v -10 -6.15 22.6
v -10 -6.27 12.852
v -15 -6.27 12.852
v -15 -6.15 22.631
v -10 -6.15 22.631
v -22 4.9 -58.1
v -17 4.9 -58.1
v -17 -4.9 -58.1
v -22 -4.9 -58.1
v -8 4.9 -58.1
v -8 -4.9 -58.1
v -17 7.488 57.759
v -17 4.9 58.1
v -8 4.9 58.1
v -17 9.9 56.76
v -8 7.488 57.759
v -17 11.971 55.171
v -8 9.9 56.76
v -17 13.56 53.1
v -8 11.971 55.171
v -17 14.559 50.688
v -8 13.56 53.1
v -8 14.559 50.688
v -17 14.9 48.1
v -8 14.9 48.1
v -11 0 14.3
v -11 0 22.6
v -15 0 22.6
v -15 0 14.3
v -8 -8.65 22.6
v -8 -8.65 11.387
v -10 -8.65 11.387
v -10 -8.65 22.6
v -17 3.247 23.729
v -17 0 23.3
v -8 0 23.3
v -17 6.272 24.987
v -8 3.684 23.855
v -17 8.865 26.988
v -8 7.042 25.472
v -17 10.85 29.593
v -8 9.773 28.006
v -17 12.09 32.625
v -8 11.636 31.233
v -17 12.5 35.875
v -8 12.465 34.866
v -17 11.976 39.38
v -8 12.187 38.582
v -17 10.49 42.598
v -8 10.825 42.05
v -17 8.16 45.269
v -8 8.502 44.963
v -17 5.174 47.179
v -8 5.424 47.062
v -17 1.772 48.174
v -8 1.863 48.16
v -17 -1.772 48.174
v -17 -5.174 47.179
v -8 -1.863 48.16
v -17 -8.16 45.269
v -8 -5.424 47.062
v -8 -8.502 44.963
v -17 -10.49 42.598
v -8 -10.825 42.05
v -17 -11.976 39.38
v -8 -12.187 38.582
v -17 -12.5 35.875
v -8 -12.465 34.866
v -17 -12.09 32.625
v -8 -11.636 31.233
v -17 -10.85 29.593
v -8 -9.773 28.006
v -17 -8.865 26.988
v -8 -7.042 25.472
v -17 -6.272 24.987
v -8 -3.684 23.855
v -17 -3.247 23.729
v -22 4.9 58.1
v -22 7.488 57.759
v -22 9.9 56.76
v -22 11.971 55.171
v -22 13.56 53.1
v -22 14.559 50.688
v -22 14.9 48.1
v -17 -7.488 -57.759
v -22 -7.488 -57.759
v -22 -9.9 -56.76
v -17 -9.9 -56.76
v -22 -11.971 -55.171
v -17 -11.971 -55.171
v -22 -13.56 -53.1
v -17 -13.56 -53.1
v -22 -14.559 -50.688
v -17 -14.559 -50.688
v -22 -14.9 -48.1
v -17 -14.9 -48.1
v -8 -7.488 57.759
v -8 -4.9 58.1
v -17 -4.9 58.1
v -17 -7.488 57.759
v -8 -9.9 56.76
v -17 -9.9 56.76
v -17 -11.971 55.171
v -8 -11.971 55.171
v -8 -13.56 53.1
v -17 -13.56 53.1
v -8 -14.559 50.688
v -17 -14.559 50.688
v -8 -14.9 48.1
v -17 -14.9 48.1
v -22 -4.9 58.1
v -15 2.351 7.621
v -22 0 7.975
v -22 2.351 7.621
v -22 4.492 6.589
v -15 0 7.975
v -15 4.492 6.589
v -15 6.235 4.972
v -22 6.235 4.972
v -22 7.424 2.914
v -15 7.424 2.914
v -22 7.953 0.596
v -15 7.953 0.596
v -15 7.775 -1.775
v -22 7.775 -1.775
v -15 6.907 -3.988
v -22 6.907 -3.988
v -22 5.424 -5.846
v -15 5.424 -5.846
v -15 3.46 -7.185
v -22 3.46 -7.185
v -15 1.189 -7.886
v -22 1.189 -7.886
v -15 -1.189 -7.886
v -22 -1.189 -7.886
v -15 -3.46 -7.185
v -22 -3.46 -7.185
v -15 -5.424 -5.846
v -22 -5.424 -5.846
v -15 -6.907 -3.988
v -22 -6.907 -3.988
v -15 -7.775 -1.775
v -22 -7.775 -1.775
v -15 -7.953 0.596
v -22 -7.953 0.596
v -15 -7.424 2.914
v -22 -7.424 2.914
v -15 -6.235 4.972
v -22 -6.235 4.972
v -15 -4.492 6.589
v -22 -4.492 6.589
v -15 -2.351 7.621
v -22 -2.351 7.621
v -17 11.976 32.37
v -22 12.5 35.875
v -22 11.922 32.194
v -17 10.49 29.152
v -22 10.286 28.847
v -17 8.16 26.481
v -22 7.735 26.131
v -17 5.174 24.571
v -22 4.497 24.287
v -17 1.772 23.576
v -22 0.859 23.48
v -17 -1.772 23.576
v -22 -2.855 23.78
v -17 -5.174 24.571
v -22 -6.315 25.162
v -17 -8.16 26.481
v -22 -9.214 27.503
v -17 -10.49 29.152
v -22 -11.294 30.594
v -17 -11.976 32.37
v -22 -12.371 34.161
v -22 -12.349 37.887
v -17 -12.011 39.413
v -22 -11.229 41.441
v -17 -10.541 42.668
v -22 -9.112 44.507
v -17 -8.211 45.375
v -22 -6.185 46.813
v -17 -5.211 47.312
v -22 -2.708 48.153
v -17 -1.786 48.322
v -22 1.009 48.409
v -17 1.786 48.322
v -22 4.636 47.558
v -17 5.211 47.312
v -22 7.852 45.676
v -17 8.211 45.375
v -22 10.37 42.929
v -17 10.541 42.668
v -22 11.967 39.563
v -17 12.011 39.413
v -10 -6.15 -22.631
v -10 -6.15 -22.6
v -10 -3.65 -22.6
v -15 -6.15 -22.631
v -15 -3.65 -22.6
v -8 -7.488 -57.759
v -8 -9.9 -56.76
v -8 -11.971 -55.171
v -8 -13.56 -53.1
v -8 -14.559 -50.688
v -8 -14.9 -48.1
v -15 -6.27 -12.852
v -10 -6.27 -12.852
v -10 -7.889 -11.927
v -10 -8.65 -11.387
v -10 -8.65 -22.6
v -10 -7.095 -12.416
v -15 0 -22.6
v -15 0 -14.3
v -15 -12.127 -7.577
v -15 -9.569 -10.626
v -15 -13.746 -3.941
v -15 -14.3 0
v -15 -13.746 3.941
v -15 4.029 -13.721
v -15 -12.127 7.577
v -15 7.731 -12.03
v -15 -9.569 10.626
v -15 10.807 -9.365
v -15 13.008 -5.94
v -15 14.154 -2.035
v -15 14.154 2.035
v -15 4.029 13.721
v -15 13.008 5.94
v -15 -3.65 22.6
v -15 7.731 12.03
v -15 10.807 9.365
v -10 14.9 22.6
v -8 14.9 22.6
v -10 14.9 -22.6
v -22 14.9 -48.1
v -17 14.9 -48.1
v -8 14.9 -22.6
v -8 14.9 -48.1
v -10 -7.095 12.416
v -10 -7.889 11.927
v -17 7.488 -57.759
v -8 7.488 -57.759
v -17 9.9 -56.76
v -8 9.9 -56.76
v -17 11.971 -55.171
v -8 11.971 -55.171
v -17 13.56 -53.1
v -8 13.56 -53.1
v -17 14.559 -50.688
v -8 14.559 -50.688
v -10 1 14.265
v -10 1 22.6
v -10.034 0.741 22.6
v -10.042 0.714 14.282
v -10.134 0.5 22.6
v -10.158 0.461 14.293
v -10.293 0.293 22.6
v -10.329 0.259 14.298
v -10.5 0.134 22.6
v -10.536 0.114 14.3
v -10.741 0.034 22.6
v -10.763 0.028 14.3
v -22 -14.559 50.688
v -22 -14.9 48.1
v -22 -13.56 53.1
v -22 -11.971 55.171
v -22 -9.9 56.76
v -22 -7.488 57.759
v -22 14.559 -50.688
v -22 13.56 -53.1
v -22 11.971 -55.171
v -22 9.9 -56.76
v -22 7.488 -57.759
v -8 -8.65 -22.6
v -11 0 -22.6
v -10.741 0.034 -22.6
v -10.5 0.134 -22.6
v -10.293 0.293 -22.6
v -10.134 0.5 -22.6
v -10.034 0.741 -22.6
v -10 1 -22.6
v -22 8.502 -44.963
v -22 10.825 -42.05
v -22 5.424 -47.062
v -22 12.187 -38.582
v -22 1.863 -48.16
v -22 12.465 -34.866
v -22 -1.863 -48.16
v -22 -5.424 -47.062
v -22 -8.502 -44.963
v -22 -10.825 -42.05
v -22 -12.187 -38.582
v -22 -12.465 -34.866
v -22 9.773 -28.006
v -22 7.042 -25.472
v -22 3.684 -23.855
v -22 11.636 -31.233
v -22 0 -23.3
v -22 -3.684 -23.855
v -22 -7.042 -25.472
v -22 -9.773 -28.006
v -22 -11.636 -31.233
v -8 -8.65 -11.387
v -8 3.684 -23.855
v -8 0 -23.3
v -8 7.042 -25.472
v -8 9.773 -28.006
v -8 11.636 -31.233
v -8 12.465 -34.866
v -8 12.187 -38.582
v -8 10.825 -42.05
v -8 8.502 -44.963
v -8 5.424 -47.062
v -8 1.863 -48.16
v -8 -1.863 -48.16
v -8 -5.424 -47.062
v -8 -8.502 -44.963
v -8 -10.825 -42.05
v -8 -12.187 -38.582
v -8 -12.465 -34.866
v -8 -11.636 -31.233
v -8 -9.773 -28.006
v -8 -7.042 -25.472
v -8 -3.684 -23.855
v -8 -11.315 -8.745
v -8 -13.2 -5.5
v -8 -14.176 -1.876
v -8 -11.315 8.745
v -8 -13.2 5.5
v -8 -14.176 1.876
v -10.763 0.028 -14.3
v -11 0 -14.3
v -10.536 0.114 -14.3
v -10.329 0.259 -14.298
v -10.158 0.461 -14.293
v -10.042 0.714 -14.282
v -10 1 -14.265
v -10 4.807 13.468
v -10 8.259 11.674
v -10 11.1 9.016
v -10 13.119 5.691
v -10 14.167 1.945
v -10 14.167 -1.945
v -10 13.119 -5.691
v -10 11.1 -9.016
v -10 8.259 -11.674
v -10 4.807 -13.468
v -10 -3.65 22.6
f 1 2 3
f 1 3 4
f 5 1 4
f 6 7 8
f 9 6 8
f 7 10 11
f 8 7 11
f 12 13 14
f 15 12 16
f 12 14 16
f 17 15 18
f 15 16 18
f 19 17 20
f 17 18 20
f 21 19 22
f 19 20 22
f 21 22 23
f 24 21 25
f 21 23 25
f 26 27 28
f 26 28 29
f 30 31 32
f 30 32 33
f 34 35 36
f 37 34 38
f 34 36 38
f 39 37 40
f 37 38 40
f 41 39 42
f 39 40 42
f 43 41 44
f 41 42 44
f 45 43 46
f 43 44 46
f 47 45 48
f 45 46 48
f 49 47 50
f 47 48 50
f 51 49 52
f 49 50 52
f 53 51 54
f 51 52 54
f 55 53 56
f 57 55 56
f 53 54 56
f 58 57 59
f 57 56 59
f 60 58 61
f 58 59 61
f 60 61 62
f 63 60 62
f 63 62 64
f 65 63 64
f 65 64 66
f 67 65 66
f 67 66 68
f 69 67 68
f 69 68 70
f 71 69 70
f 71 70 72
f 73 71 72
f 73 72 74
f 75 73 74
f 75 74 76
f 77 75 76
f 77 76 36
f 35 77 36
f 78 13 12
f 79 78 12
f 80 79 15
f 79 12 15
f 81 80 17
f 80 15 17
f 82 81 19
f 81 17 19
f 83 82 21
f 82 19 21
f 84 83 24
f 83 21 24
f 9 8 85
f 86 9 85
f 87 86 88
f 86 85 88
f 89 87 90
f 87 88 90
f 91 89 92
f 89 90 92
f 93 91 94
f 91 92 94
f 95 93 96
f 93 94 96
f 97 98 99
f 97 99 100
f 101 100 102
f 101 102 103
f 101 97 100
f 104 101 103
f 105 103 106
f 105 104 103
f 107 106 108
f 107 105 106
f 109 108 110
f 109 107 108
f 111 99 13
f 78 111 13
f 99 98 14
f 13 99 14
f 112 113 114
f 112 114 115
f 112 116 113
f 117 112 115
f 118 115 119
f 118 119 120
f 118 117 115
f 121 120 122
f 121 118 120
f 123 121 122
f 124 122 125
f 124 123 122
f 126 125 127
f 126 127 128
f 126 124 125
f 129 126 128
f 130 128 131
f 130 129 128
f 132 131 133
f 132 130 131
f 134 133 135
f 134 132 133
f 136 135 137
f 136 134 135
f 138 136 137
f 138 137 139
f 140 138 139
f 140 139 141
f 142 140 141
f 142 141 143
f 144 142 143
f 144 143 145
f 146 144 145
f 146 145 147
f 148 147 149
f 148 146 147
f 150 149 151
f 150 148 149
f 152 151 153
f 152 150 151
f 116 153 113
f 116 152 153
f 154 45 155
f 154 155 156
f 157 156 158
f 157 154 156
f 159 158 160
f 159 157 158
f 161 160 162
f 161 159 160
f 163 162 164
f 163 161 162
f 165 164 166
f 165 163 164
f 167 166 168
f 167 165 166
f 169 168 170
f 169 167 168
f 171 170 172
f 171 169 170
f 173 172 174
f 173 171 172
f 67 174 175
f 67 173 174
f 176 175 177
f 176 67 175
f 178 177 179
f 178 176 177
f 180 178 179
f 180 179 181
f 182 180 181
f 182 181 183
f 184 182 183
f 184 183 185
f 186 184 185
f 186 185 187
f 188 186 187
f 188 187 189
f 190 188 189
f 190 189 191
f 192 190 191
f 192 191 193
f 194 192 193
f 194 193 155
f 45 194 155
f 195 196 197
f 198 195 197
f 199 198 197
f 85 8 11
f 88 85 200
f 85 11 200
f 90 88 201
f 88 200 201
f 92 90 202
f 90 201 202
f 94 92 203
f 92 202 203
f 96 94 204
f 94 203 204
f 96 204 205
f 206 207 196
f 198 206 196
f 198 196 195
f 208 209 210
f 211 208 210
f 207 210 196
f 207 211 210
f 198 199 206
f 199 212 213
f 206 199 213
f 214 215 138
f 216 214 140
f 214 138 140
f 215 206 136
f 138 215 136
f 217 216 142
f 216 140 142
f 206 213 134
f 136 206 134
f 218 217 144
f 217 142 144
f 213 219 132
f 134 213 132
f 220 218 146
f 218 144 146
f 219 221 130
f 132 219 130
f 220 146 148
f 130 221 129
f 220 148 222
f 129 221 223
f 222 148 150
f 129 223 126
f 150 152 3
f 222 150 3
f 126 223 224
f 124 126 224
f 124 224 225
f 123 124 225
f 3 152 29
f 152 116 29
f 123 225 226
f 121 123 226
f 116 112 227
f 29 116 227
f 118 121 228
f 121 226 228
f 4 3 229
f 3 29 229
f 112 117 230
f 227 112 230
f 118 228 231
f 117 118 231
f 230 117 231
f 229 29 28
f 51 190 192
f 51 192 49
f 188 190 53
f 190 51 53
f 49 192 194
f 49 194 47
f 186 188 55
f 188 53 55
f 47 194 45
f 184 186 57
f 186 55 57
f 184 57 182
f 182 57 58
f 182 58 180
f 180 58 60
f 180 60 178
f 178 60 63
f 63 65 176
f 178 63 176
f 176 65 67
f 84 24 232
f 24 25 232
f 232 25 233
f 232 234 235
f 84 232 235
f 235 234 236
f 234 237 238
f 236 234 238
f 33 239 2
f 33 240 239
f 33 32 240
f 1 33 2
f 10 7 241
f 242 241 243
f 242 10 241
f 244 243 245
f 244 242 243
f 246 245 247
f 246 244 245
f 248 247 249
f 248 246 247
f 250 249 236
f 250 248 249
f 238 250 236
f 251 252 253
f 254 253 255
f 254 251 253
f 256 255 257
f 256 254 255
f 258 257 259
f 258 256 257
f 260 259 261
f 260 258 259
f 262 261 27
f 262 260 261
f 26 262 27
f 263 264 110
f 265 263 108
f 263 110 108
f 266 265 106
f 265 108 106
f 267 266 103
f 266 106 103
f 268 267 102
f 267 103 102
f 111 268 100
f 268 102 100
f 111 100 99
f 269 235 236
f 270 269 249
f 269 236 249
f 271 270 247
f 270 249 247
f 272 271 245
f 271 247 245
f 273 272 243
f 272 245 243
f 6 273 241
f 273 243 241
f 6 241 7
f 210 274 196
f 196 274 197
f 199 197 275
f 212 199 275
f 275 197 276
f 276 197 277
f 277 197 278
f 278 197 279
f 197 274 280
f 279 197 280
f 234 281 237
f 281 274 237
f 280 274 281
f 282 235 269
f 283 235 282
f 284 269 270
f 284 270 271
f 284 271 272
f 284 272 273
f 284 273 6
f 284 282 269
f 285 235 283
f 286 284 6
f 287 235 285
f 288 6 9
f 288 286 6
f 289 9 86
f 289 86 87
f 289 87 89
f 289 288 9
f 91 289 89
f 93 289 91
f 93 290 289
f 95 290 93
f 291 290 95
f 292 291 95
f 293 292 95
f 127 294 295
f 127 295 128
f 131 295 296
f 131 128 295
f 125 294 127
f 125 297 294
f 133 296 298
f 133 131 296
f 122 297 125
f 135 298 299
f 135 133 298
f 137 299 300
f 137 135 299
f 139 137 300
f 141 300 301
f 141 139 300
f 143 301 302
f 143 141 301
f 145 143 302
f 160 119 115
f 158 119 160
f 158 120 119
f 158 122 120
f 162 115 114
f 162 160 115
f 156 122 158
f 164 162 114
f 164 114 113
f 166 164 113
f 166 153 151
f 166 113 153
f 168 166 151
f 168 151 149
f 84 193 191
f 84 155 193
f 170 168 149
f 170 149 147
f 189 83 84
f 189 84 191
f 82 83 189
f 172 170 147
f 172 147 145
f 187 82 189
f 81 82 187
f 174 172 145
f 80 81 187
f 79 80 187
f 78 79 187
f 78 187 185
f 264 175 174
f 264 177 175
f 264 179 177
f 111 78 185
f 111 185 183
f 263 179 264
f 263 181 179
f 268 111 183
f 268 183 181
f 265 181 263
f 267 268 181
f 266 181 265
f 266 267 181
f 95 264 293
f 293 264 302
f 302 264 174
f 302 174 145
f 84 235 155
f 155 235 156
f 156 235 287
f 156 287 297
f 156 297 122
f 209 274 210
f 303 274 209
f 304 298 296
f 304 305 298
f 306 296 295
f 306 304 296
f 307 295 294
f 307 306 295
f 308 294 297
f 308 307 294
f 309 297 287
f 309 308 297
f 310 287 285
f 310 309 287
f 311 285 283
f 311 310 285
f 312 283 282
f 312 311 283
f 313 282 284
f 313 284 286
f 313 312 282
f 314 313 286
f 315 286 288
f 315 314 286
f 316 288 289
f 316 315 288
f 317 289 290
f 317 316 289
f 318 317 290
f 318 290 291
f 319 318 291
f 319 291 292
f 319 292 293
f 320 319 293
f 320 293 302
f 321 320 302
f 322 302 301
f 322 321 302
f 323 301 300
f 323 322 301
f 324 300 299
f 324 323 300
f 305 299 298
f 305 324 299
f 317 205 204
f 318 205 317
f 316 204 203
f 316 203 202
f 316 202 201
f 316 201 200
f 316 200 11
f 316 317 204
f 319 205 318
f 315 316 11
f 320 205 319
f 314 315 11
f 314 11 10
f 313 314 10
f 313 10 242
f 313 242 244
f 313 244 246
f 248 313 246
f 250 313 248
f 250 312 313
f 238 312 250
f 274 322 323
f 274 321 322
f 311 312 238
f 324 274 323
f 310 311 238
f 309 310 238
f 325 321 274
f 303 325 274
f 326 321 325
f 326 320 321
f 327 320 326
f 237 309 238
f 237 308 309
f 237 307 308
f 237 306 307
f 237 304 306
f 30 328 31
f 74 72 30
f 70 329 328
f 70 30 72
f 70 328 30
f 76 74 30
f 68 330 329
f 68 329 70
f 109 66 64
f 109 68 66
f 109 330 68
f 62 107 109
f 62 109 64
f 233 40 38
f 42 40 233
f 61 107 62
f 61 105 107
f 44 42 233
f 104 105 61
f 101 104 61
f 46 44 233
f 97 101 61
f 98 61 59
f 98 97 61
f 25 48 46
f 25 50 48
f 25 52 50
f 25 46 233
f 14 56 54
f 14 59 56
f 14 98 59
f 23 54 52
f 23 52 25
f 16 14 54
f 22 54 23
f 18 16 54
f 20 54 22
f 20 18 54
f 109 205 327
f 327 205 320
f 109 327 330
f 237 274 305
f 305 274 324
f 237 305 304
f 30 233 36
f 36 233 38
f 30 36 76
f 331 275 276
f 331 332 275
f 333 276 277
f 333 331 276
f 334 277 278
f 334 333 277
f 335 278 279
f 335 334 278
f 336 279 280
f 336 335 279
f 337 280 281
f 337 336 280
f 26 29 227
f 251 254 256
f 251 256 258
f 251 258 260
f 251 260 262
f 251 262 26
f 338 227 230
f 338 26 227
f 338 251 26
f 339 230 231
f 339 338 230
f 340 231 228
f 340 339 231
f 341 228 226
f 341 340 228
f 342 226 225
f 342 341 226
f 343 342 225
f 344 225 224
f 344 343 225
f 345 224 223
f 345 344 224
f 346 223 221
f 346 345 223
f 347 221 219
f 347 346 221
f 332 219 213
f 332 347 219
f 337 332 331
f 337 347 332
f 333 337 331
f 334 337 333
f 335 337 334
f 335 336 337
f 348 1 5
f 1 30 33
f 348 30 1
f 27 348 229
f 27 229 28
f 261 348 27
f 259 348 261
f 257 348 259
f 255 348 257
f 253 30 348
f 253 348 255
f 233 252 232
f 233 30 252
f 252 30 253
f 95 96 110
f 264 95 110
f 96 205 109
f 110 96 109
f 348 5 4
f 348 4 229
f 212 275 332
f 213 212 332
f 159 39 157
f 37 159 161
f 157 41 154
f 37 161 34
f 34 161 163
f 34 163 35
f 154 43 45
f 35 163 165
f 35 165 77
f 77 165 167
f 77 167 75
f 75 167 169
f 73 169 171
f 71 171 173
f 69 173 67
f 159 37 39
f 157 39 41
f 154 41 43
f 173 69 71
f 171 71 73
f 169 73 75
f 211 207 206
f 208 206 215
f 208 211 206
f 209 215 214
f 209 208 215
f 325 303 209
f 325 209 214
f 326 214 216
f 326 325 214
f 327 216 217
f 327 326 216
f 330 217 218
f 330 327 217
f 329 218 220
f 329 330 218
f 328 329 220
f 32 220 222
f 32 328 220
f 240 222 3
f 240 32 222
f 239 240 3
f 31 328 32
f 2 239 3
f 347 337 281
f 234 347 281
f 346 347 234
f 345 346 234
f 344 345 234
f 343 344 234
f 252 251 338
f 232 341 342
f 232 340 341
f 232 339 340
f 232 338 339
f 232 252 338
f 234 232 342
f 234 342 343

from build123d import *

# Parameters (mm, degrees)
BOSS_EXTRUDE1_START  = -17
BOSS_EXTRUDE1_DEPTH  = 34
SKETCH2_R            = 14.3
CUT_EXTRUDE1_DEPTH   = 32
SKETCH3_R            = 7.975
CUT_EXTRUDE2_DEPTH   = 68.982497748
SKETCH4_R            = 12.5
CUT_EXTRUDE3_DEPTH   = 69.946500999
FILLET5_R            = 10
FILLET6_R            = 10
FILLET5_OF_MIRROR1_R = 10
FILLET6_OF_MIRROR1_R = 10
SKETCH12_W           = 71.004828568
SKETCH12_H           = 128.011080482
CUT_EXTRUDE4_DEPTH   = 25
SKETCH13_W           = 23.55
SKETCH13_H           = 45.2
CUT_EXTRUDE5_DEPTH   = 2
CUT_EXTRUDE6_DEPTH   = 5
SKETCH15_R           = 12.5
SKETCH15_R_2         = 7.975
BOSS_EXTRUDE2_DEPTH  = 5
FILLET7_R            = 1
FILLET8_R            = 1


with BuildPart() as part:
    # Sketch1 → Boss-Extrude1 (new body)
    with BuildSketch(Plane.YZ.offset(BOSS_EXTRUDE1_START)):
        with BuildLine():
            Line((-14.9, 0), (-14.9, 58.1))
            Line((-14.9, 58.1), (14.9, 58.1))
            Line((14.9, 58.1), (14.9, 0))
            ThreePointArc((14.9, 0), (0, -14.9), (-14.9, 0))
        make_face()
    boss_extrude1 = extrude(amount=BOSS_EXTRUDE1_DEPTH)

    # Sketch2 → Cut-Extrude1 (cut)
    with BuildSketch(Plane.YZ.offset(17)):
        with Locations(Location((0, 0, 0), (0, 0, 270))):
            Circle(SKETCH2_R)
    cut_extrude1 = extrude(amount=-CUT_EXTRUDE1_DEPTH, mode=Mode.SUBTRACT)

    # Sketch3 → Cut-Extrude2 (cut, through all)
    with BuildSketch(Plane.YZ.offset(-15)):
        with Locations(Location((0, 0, 0), (0, 0, 270))):
            Circle(SKETCH3_R)
    cut_extrude2 = extrude(amount=-CUT_EXTRUDE2_DEPTH, mode=Mode.SUBTRACT)

    # Sketch4 → Cut-Extrude3 (cut, through all)
    with BuildSketch(Plane.YZ.offset(17)):
        with Locations(Location((0, 35.8, 0), (0, 0, 270))):
            Circle(SKETCH4_R)
    cut_extrude3 = extrude(amount=-CUT_EXTRUDE3_DEPTH, mode=Mode.SUBTRACT)

    # Fillet5
    fillet5_edges = [part.edges().sort_by_distance(p)[0] for p in [
        (0, 14.9, 58.1),
    ]]
    fillet(fillet5_edges, radius=FILLET5_R)

    # Fillet6
    fillet6_edges = [part.edges().sort_by_distance(p)[0] for p in [
        (0, -14.9, 58.1),
    ]]
    fillet(fillet6_edges, radius=FILLET6_R)

    # Mirror1: Boss-Extrude1, Cut-Extrude1, Cut-Extrude2, Cut-Extrude3 across plane
    add(boss_extrude1.mirror(Plane.XY))
    add(cut_extrude1.mirror(Plane.XY), mode=Mode.SUBTRACT)
    add(cut_extrude2.mirror(Plane.XY), mode=Mode.SUBTRACT)
    add(cut_extrude3.mirror(Plane.XY), mode=Mode.SUBTRACT)

    # Fillet5 of Mirror1
    fillet5_of_mirror1_edges = [part.edges().sort_by_distance(p)[0] for p in [
        (0, 14.9, -58.1),
    ]]
    fillet(fillet5_of_mirror1_edges, radius=FILLET5_OF_MIRROR1_R)

    # Fillet6 of Mirror1
    fillet6_of_mirror1_edges = [part.edges().sort_by_distance(p)[0] for p in [
        (0, -14.9, -58.1),
    ]]
    fillet(fillet6_of_mirror1_edges, radius=FILLET6_OF_MIRROR1_R)

    # Sketch12 → Cut-Extrude4 (cut)
    with BuildSketch(Plane.YZ.offset(17)):
        Rectangle(SKETCH12_W, SKETCH12_H)
    extrude(amount=-CUT_EXTRUDE4_DEPTH, mode=Mode.SUBTRACT)

    # Sketch13 → Cut-Extrude5 (cut)
    with BuildSketch(Plane.YZ.offset(-8)):
        with Locations((3.125, 0)):
            Rectangle(SKETCH13_W, SKETCH13_H)
    extrude(amount=-CUT_EXTRUDE5_DEPTH, mode=Mode.SUBTRACT)

    # Sketch14 → Cut-Extrude6 (cut)
    with BuildSketch(Plane.YZ.offset(-10)):
        with BuildLine():
            Line((-6.1496227, -22.630710053), (-3.65, -22.6))
            Line((-3.65, -22.6), (0, -22.6))
            Line((0, -22.6), (0, -14.3))
            ThreePointArc((0, -14.3), (-1.840302956, -14.181088993), (-3.65, -13.82633357))
            ThreePointArc((-3.65, -13.82633357), (-4.983735764, -13.403446491), (-6.269759745, -12.852241545))
            Line((-6.269759745, -12.852241545), (-6.1496227, -22.630710053))
        make_face()
    cut_extrude6 = extrude(amount=-CUT_EXTRUDE6_DEPTH, mode=Mode.SUBTRACT)

    # Mirror2: Cut-Extrude6 across plane
    add(cut_extrude6.mirror(Plane.XY), mode=Mode.SUBTRACT)

    # Sketch15 → Boss-Extrude2 (add)
    with BuildSketch(Plane(origin=(-17, 0, 0), x_dir=(0, -1, 0), z_dir=(-1, 0, 0))):
        with BuildLine():
            Line((-4.9, -58.1), (4.9, -58.1))
            ThreePointArc((4.9, -58.1), (11.971067812, -55.171067812), (14.9, -48.1))
            Line((14.9, -48.1), (14.9, 48.1))
            ThreePointArc((14.9, 48.1), (11.971067812, 55.171067812), (4.9, 58.1))
            Line((4.9, 58.1), (-4.9, 58.1))
            ThreePointArc((-4.9, 58.1), (-11.971067812, 55.171067812), (-14.9, 48.1))
            Line((-14.9, 48.1), (-14.9, -48.1))
            ThreePointArc((-14.9, -48.1), (-11.971067812, -55.171067812), (-4.9, -58.1))
        make_face()
        with Locations(Location((0, 35.95, 0), (0, 0, 180.34377674))):
            Circle(SKETCH15_R, mode=Mode.SUBTRACT)
        with Locations(Location((0, 0, 0), (0, 0, 90))):
            Circle(SKETCH15_R_2, mode=Mode.SUBTRACT)
        with Locations(Location((0, -35.8, 0), (0, 0, 90))):
            Circle(SKETCH15_R, mode=Mode.SUBTRACT)
    extrude(amount=BOSS_EXTRUDE2_DEPTH)

    # Fillet7
    fillet7_edges = [part.edges().sort_by_distance(p)[0] for p in [
        (-10, 0, -18.45),
    ]]
    fillet(fillet7_edges, radius=FILLET7_R)

    # Fillet8
    fillet8_edges = [part.edges().sort_by_distance(p)[0] for p in [
        (-10, 0, 18.45),
    ]]
    fillet(fillet8_edges, radius=FILLET8_R)


solid = part.part
